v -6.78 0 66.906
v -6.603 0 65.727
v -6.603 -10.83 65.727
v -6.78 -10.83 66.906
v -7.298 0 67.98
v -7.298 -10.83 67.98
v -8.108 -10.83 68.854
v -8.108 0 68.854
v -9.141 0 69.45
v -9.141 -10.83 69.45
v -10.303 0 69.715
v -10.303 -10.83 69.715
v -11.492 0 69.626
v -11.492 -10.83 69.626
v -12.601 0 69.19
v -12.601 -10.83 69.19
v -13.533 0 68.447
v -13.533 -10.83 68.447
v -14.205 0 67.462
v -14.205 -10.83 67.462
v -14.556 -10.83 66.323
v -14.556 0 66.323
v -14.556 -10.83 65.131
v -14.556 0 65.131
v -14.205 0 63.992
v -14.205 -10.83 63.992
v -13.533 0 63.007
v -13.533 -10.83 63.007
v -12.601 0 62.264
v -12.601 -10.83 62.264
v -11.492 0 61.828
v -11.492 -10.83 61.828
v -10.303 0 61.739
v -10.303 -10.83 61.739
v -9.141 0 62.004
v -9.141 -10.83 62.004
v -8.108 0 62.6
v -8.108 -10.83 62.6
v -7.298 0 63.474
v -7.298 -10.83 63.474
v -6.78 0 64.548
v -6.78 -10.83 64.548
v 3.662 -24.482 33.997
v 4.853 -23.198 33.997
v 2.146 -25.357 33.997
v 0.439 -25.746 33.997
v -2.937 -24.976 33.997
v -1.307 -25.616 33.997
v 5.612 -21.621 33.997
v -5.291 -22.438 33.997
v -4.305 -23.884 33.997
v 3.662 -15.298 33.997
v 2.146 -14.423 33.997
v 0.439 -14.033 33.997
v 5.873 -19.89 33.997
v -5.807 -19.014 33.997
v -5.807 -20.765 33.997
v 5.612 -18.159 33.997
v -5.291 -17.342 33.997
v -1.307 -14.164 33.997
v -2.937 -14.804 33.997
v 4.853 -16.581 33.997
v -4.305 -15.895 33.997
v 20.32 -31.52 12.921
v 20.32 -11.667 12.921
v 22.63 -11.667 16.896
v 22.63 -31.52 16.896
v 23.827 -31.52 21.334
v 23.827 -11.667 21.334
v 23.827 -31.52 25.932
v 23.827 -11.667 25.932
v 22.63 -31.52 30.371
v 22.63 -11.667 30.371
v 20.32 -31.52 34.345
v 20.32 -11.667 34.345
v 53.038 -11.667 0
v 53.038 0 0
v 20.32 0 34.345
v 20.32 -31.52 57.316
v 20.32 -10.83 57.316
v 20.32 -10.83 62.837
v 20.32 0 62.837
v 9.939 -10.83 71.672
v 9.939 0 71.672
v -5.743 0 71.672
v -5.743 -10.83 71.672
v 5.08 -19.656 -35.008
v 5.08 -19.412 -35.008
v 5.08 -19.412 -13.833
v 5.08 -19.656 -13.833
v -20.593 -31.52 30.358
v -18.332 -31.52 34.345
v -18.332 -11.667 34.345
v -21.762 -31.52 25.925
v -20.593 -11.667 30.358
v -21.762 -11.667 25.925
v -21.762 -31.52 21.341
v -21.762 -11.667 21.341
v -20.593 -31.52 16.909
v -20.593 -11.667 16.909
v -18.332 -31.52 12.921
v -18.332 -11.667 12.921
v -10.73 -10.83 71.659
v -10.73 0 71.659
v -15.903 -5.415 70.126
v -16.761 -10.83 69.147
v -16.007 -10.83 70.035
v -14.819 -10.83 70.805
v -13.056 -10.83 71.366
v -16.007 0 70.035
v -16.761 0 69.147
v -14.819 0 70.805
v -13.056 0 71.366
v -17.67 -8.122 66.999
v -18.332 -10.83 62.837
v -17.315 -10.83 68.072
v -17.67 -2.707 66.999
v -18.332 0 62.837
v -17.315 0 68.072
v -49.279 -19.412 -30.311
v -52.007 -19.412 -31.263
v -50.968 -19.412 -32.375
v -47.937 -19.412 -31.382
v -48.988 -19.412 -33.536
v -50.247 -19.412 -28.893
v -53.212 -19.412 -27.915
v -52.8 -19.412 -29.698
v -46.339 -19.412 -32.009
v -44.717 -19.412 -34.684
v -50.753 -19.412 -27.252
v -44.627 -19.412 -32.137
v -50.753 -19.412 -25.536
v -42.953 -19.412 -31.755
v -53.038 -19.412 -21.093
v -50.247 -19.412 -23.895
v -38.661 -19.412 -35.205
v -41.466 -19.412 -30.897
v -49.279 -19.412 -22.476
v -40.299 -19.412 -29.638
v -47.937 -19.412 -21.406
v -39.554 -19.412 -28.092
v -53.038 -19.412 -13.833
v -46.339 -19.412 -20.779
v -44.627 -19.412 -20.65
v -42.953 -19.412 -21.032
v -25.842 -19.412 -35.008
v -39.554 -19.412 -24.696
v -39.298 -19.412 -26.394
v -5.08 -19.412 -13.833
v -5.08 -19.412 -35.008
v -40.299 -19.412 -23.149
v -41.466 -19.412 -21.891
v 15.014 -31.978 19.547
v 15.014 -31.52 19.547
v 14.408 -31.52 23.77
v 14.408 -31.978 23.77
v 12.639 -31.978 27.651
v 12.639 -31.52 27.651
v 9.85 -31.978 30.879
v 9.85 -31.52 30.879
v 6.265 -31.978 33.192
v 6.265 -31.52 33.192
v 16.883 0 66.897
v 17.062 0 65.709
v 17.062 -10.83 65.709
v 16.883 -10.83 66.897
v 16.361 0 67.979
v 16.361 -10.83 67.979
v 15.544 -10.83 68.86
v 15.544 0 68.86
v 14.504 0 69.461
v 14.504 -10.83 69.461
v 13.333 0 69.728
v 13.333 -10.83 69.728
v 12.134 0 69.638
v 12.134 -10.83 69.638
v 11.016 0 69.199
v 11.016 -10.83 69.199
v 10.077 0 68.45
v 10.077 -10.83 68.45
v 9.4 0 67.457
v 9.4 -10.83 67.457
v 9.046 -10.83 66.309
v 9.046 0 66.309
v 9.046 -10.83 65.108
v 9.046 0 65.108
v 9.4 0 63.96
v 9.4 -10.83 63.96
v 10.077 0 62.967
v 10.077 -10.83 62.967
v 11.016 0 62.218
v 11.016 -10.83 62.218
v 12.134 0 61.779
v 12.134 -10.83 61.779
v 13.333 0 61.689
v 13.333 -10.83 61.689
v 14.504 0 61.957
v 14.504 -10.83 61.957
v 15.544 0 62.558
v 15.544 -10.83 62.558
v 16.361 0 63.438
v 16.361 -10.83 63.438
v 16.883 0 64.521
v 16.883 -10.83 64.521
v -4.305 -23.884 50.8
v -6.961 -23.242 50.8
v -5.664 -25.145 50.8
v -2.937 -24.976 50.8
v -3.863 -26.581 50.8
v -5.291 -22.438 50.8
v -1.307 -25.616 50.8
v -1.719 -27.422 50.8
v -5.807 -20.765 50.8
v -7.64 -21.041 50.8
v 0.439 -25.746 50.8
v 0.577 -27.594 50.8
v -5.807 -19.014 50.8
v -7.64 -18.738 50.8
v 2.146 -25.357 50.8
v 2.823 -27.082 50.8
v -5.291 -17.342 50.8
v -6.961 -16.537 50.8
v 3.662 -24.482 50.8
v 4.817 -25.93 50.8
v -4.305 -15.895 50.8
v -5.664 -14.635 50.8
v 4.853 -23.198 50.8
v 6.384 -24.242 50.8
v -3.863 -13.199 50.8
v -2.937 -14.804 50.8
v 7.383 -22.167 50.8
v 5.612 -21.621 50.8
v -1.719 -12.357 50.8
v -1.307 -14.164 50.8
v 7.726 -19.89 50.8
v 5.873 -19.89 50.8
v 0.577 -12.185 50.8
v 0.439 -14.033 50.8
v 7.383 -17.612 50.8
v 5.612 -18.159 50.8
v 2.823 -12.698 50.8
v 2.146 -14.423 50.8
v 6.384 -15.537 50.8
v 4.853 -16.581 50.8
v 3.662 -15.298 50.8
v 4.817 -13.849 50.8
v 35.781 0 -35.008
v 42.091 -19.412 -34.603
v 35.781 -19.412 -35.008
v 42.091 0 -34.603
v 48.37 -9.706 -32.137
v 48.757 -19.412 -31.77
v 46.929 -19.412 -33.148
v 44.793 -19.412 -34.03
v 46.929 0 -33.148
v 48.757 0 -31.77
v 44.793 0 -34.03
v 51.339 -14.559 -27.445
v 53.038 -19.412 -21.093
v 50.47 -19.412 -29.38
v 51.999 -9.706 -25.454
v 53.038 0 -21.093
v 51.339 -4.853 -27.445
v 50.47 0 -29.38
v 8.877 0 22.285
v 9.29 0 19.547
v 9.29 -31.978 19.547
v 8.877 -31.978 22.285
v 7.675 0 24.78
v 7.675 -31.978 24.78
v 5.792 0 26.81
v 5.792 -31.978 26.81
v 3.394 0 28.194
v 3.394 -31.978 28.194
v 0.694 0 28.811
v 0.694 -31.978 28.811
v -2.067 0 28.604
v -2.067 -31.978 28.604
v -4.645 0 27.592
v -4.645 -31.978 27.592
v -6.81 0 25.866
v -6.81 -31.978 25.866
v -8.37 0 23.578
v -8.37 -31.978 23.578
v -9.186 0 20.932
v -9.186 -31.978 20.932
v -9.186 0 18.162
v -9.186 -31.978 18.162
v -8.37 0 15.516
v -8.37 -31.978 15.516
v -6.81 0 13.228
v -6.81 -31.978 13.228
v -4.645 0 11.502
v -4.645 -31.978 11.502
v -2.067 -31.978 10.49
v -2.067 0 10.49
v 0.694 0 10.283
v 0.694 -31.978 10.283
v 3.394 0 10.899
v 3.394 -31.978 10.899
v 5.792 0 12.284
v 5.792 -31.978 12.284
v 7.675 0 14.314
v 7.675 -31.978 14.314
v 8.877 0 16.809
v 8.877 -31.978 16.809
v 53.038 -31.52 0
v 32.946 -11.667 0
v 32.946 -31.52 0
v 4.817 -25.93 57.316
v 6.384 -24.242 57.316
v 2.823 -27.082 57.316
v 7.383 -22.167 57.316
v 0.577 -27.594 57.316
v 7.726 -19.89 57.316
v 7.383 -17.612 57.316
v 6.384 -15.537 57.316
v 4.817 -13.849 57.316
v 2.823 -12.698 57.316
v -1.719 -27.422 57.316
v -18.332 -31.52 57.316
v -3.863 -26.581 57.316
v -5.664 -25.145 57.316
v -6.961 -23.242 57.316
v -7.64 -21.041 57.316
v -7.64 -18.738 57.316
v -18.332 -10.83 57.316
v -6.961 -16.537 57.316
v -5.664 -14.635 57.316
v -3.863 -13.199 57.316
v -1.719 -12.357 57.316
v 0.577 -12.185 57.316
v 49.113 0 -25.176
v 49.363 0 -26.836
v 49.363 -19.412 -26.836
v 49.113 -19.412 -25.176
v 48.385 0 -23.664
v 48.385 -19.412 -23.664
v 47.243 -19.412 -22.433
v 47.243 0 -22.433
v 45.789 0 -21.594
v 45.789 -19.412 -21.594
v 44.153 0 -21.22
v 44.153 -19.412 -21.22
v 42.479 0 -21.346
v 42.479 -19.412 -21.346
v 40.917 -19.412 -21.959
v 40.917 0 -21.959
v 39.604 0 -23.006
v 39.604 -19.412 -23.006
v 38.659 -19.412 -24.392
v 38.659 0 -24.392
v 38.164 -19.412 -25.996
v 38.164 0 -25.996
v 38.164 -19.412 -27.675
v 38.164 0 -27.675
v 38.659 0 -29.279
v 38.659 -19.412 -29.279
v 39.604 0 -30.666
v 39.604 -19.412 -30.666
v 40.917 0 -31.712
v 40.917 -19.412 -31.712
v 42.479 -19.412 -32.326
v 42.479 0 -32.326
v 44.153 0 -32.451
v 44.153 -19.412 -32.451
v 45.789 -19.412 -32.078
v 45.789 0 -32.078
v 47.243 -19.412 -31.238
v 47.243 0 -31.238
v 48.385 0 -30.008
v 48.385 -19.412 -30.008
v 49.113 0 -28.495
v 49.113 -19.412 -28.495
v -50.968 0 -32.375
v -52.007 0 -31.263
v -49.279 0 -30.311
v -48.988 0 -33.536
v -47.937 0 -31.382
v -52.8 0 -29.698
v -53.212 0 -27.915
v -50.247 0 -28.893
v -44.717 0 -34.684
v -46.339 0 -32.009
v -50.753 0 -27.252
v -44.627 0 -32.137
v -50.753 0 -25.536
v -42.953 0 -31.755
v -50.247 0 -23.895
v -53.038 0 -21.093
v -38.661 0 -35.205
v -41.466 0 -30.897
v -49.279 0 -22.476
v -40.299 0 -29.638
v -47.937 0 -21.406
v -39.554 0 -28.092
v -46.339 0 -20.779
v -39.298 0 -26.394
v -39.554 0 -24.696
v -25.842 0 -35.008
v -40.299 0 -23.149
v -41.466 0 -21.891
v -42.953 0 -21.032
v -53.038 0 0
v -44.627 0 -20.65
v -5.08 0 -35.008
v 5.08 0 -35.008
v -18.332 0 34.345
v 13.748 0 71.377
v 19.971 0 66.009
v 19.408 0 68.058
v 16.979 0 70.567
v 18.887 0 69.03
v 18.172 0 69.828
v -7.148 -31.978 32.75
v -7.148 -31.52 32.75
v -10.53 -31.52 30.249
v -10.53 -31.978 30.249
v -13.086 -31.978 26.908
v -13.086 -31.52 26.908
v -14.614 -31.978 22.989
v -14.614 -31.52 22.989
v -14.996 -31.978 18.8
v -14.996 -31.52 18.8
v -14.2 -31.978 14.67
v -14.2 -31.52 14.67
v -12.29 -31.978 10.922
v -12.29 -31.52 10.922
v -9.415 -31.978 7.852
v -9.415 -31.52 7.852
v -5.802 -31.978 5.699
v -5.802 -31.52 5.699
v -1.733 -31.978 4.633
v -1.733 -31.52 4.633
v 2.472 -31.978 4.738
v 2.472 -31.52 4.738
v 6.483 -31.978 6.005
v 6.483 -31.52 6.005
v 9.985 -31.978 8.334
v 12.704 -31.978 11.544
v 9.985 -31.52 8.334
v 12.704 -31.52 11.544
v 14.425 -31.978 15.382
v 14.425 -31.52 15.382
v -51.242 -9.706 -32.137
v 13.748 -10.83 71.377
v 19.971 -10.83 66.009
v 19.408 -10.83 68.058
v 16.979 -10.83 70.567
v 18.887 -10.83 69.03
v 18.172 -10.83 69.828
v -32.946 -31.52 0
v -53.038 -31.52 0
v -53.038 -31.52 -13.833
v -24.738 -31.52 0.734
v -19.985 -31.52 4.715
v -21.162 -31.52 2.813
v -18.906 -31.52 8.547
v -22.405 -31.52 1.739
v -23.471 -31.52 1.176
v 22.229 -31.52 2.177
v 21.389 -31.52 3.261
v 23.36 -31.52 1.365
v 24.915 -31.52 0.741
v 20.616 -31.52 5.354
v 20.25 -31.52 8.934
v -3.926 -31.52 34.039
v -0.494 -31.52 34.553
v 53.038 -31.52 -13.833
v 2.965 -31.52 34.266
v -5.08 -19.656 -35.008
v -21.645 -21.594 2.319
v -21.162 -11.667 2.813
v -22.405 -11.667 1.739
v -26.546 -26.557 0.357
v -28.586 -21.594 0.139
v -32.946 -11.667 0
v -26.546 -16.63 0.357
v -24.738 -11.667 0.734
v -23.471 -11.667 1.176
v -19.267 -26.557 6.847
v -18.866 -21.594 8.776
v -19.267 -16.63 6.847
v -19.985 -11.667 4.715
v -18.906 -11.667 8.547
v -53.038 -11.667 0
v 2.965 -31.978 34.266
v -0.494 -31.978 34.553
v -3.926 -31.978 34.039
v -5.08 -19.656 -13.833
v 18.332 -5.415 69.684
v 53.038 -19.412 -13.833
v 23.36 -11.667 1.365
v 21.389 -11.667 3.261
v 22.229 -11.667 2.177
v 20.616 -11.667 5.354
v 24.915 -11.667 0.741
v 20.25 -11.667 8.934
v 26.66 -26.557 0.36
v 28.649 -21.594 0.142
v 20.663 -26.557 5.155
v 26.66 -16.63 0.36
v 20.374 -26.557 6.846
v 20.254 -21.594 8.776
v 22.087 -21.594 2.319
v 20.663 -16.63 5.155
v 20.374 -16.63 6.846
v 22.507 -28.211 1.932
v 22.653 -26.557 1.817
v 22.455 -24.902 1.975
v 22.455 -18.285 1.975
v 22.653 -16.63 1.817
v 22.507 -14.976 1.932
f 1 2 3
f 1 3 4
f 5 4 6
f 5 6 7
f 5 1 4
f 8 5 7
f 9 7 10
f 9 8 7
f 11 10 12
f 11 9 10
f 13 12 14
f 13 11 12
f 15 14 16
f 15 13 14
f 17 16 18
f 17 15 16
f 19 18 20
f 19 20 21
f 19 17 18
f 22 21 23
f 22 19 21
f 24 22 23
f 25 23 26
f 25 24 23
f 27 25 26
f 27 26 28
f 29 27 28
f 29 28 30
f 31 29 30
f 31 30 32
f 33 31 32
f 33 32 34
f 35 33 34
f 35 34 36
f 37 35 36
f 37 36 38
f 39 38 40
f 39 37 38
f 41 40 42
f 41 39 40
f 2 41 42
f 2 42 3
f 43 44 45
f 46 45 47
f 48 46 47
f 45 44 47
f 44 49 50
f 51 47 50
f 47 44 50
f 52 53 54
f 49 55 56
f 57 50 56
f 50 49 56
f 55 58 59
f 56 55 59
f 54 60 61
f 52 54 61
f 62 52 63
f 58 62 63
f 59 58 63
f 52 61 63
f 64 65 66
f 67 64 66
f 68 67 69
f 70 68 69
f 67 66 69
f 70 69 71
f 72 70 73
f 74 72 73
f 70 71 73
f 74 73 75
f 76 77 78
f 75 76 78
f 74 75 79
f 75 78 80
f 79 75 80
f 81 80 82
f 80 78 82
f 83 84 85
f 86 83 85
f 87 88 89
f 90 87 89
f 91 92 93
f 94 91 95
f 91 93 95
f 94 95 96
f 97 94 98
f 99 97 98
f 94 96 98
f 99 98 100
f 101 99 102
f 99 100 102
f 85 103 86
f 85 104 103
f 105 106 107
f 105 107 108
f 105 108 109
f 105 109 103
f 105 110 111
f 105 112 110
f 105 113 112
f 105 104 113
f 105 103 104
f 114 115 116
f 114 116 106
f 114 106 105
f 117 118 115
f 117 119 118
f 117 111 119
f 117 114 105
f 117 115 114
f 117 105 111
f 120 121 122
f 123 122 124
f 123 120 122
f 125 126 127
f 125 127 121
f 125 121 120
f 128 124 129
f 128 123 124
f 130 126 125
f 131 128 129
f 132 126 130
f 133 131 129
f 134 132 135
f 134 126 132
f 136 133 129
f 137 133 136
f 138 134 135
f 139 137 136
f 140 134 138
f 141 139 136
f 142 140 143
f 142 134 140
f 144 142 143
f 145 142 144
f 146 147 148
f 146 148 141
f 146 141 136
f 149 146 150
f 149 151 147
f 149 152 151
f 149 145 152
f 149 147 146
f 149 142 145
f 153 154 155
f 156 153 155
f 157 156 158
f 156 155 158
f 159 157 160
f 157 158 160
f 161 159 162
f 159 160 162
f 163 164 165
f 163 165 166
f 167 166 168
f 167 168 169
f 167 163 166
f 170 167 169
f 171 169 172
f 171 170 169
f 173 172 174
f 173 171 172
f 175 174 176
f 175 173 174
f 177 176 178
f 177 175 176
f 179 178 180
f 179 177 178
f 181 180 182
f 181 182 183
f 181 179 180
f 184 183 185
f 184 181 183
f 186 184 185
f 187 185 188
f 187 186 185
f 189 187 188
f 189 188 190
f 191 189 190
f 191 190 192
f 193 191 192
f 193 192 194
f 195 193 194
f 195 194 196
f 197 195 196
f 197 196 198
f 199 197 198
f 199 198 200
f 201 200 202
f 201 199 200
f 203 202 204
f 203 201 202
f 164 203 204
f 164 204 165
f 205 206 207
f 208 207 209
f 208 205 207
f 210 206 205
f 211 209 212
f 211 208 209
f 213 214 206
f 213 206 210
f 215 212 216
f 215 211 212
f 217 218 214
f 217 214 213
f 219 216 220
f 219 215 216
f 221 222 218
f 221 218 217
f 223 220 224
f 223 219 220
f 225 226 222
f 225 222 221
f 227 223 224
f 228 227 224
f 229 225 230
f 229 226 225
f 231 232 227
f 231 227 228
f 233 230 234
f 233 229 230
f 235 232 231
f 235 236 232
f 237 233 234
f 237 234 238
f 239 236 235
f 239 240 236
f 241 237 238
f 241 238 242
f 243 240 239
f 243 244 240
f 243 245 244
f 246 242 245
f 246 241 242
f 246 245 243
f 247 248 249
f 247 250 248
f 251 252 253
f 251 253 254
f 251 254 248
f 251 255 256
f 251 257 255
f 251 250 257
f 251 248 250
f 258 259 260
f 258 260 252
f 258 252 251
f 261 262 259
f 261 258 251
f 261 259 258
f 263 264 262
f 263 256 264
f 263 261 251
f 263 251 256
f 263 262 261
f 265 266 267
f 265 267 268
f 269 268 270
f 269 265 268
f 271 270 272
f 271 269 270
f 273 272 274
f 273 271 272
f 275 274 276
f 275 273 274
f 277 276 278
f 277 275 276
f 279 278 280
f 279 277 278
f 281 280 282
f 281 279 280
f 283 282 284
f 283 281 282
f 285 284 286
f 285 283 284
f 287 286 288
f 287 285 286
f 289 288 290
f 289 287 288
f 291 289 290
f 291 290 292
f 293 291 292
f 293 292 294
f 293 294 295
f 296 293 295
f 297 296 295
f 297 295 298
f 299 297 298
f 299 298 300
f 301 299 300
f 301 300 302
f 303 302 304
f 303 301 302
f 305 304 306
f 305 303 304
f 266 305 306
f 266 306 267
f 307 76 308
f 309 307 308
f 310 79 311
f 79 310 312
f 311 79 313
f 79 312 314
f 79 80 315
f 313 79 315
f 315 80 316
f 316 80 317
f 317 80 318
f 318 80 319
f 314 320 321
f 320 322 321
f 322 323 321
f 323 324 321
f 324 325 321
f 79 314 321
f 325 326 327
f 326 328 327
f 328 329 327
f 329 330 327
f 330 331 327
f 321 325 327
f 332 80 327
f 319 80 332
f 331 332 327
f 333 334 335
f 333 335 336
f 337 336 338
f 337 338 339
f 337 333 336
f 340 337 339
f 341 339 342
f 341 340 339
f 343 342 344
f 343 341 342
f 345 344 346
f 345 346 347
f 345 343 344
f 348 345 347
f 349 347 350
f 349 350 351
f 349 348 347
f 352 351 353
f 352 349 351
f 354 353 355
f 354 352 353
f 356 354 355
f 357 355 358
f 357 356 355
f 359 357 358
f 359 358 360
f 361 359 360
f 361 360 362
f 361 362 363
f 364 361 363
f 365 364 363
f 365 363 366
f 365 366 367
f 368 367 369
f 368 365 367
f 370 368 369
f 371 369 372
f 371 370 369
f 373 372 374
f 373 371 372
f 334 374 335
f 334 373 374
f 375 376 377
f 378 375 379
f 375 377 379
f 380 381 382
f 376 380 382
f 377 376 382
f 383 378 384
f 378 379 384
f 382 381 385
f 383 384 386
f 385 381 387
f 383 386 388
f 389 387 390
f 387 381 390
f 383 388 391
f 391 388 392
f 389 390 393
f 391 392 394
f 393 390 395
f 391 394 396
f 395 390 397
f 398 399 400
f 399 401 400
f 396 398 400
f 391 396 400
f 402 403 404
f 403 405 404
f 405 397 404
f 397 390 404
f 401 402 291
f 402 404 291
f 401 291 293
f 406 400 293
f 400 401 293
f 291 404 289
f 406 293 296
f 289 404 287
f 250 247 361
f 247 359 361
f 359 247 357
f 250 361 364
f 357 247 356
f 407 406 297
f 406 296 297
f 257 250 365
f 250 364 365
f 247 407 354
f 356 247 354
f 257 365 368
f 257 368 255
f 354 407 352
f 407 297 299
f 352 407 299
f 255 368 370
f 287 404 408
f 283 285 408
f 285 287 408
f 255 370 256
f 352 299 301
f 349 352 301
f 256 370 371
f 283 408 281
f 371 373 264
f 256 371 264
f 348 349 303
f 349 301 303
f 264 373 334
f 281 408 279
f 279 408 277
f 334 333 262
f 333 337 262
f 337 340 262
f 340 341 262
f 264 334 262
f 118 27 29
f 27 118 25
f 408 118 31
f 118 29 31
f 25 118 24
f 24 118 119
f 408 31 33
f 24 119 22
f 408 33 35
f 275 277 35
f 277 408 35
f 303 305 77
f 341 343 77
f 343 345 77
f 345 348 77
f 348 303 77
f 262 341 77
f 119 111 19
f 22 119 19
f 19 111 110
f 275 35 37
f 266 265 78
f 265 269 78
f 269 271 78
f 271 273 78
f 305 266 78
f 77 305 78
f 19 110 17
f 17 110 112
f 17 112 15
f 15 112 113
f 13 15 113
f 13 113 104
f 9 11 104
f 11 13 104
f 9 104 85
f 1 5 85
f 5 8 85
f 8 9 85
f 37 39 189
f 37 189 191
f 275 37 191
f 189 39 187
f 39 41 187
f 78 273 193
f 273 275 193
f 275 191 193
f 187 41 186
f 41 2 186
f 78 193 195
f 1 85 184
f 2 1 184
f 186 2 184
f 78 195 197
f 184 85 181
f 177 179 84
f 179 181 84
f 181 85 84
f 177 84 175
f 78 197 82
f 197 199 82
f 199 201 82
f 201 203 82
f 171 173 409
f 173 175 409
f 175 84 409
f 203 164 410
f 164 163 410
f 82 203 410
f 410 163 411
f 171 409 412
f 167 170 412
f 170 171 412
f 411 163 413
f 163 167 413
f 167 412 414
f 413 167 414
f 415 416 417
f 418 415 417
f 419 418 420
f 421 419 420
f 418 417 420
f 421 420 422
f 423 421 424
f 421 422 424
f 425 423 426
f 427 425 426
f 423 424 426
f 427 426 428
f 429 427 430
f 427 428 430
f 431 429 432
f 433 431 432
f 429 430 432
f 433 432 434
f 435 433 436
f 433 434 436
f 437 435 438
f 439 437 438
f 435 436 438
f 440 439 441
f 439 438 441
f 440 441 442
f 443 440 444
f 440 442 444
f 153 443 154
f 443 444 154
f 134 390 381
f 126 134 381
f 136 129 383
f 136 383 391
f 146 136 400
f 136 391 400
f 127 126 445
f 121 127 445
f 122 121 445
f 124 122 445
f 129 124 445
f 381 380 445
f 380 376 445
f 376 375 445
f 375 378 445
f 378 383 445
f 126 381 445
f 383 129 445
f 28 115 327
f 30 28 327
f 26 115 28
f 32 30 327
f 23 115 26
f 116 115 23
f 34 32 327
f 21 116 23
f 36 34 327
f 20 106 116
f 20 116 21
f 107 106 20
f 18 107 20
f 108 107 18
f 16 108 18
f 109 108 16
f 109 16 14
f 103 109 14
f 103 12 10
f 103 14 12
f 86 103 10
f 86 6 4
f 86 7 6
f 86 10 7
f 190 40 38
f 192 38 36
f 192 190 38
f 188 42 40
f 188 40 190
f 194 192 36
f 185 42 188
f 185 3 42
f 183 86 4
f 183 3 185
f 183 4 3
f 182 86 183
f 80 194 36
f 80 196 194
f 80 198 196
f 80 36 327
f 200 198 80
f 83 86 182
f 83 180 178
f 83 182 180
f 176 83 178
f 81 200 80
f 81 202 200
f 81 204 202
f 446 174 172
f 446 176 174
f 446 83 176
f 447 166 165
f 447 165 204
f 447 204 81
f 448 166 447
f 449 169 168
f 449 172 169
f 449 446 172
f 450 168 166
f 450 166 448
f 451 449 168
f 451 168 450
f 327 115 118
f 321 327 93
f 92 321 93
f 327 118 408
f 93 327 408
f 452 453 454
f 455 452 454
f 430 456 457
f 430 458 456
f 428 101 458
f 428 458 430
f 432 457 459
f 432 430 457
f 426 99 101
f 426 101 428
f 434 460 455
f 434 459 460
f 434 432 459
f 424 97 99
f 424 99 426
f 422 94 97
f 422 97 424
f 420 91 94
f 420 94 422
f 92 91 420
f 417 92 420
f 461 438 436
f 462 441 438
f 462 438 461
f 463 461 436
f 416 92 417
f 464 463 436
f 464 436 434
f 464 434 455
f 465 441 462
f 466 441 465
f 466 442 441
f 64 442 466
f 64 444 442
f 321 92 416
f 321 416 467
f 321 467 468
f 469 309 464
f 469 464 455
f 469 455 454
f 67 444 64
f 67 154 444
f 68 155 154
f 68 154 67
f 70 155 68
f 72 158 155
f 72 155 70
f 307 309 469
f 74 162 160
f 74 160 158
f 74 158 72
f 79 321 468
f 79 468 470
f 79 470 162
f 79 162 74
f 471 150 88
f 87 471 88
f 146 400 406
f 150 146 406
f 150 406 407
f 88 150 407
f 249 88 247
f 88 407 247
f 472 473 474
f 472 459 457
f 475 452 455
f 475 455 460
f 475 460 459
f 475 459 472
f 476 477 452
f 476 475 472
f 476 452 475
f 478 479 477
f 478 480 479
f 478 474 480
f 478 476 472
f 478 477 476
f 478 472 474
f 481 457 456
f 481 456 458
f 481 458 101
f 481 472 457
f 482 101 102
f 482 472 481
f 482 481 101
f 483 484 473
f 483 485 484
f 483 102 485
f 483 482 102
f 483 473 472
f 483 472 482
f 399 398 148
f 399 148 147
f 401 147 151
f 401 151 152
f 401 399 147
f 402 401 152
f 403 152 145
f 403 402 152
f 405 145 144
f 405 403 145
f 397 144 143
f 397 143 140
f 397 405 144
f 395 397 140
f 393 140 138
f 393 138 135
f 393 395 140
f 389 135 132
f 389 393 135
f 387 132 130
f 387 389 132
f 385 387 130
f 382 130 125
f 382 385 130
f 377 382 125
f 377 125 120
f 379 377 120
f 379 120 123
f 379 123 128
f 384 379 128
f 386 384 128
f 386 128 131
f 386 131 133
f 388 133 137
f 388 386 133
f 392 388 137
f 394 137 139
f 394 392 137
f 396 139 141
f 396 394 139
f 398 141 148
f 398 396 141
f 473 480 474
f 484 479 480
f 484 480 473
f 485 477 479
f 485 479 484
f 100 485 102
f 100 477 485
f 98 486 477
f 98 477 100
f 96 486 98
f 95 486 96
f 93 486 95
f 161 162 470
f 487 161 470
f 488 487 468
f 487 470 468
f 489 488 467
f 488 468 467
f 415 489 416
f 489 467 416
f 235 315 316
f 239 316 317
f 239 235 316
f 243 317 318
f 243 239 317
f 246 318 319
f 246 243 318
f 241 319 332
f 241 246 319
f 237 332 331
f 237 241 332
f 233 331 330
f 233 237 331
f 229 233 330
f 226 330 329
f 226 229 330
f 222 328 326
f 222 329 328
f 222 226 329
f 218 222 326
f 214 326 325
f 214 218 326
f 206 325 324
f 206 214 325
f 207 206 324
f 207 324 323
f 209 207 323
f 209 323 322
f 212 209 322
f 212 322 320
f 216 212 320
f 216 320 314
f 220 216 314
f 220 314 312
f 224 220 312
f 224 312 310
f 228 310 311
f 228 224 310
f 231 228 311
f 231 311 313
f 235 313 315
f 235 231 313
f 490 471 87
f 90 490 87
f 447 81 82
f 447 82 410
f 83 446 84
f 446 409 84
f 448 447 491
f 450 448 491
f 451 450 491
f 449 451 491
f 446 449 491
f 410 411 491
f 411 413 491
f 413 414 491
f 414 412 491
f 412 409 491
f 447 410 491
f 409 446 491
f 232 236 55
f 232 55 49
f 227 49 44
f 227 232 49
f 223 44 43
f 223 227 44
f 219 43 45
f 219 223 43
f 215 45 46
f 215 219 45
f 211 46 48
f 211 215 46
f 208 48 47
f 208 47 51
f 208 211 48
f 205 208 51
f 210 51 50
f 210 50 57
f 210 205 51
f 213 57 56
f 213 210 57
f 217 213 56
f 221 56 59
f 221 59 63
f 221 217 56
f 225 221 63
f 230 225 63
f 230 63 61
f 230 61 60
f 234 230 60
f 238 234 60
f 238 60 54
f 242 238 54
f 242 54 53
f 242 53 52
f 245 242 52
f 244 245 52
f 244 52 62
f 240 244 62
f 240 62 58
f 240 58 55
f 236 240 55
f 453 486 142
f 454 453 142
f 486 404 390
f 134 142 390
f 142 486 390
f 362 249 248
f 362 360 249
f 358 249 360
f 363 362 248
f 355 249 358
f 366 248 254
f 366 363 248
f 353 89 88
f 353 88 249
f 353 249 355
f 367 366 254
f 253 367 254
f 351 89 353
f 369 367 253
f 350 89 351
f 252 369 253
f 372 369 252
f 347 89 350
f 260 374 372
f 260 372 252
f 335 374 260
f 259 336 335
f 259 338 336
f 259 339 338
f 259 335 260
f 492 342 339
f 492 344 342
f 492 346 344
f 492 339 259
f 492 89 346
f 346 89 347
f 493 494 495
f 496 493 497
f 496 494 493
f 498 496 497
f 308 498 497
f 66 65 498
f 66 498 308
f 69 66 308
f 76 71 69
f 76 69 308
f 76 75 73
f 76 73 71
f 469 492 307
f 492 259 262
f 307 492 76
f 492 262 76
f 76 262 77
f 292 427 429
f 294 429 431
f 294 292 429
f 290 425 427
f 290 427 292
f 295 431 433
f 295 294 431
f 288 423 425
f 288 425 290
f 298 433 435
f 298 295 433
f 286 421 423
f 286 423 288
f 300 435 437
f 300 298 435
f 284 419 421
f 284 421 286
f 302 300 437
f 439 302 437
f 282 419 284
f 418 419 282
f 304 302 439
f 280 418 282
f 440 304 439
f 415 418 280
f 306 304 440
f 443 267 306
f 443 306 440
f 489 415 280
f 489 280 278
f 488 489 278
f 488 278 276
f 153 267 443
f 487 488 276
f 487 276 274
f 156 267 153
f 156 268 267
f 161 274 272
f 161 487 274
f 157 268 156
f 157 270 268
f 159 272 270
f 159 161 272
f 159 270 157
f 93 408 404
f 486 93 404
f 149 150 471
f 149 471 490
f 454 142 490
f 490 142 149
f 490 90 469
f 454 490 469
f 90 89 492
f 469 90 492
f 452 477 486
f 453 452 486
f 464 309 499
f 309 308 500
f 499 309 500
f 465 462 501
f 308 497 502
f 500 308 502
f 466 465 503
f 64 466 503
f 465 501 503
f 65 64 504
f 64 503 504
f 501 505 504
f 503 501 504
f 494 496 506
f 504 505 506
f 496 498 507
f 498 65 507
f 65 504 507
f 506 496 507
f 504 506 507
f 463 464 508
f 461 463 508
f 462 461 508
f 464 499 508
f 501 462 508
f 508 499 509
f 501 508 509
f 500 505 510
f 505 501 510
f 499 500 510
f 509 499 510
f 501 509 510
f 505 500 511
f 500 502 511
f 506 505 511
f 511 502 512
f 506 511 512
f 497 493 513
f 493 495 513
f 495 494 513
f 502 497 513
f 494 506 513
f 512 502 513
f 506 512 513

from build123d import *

# Parameters (mm, degrees)
F1_DEPTH  = 31.52012
F0_R      = 3.9989944529
F0_R_2    = 4.0304935081
F2_DEPTH  = 10.8295
F3_DEPTH  = 11.66704
F0_R_3    = 9.2896599899
F4_DEPTH  = 31.97776
F6_R      = 7.7262681343
F6_R_2    = 5.87306791
F7_DEPTH  = 7.37838
F9_DEPTH  = 23.31858
F0_R_4    = 5.7595758306
F0_R_5    = 5.6310949549
F10_DEPTH = 19.41152
F0_W      = 10.16
F0_H      = 21.1746012493
F11_DEPTH = 19.65592


# Not quite as in the source:
# - a feature names something its author has since deleted; it is built from what else it names
# - the program builds the solid bodies; features that only make, move or delete a surface that nothing else refers to are left out


with BuildPart() as f1:
    # F0 (on Front) → F1 (new body)
    with BuildSketch(Plane.XZ):
        with BuildLine():
            Line((-32.945703147, 0), (-53.0377118984, 0))
            Line((-53.0377118984, 0), (-53.0377118984, -13.8332377828))
            Line((-53.0377118984, -13.8332377828), (-5.08, -13.8332377828))
            Line((-5.08, -13.8332377828), (5.08, -13.8332377828))
            Line((5.08, -13.8332377828), (53.0377118984, -13.8332377828))
            Line((53.0377118984, -13.8332377828), (53.0377118984, 0))
            Line((53.0377118984, 0), (32.945703147, 0))
            add(Edge.make_bspline(
                [(32.945703147, 0), (28.5647447129, 0.0625927983), (19.8735598839, 0.1867678132), (20.1720018391, 8.6992646442), (20.3200084018, 12.9208741543)],
                knots=[0, 0, 0, 0, 0.5040691828, 1, 1, 1, 1], degree=3))
            ThreePointArc((20.3200084018, 12.9208741543), (23.9781287511, 23.6330514006), (20.3200084018, 34.345228647))
            Line((20.3200084018, 34.345228647), (20.3200084018, 57.3156722881))
            Line((20.3200084018, 57.3156722881), (-18.3321793468, 57.3156722881))
            Line((-18.3321793468, 57.3156722881), (-18.3321793468, 34.345228647))
            ThreePointArc((-18.3321793468, 34.345228647), (-21.9102829622, 23.6330514006), (-18.3321793468, 12.9208741543))
            add(Edge.make_bspline(
                [(-32.945703147, 0), (-28.5122837396, 0.0592468916), (-19.728591274, 0.176629532), (-18.7947032642, 8.6996856696), (-18.3321793468, 12.9208741543)],
                knots=[0, 0, 0, 0, 0.5047329952, 1, 1, 1, 1], degree=3))
        make_face()
        with BuildLine():
            ThreePointArc((6.2648822412, 33.191720318), (12.6390408842, 27.6514544893), (15.0142637131, 19.5469643528))
            ThreePointArc((15.0142637131, 19.5469643528), (-7.6843579979, 6.6481753784), (-7.1484956716, 32.75026411))
            ThreePointArc((-7.1484956716, 32.75026411), (-0.4938765731, 34.5531031225), (6.2648822412, 33.191720318))
        make_face(mode=Mode.SUBTRACT)
    extrude(amount=F1_DEPTH)

    # F0 (on Front) → F2 (join)
    with BuildSketch(Plane.XZ):
        with BuildLine():
            Line((-18.3321793468, 62.8374100943), (-18.3321793468, 57.3156722881))
            Line((-18.3321793468, 57.3156722881), (20.3200084018, 57.3156722881))
            Line((20.3200084018, 57.3156722881), (20.3200084018, 62.8374100943))
            add(Edge.make_bspline(
                [(20.3200084018, 62.8374100943), (20.1052749574, 65.5197235908), (19.6543576651, 71.15229537), (13.2786405866, 71.4934853371), (9.9391337225, 71.6721956254)],
                knots=[0, 0, 0, 0, 0.4762147029, 1, 1, 1, 1], degree=3))
            Line((9.9391337225, 71.6721956254), (-5.7426103852, 71.6721956254))
            add(Edge.make_bspline(
                [(-18.3321793468, 62.8374100943), (-18.0134703448, 65.7269619482), (-17.326155356, 71.9584530192), (-9.7862501304, 71.772123737), (-5.7426103852, 71.6721956254)],
                knots=[0, 0, 0, 0, 0.4637015156, 1, 1, 1, 1], degree=3))
        make_face()
        with Locations((-10.6017430574, 65.7269619482)):
            Circle(F0_R, mode=Mode.SUBTRACT)
        with Locations((13.0313078181, 65.7087189627)):
            Circle(F0_R_2, mode=Mode.SUBTRACT)
    extrude(amount=F2_DEPTH)

    # F0 (on Front) → F3 (join)
    with BuildSketch(Plane.XZ):
        with BuildLine():
            Line((-18.3321793468, 34.345228647), (-53.0377118984, 0))
            Line((-53.0377118984, 0), (-32.945703147, 0))
            add(Edge.make_bspline(
                [(-32.945703147, 0), (-28.5122837396, 0.0592468916), (-19.728591274, 0.176629532), (-18.7947032642, 8.6996856696), (-18.3321793468, 12.9208741543)],
                knots=[0, 0, 0, 0, 0.5047329952, 1, 1, 1, 1], degree=3))
            ThreePointArc((-18.3321793468, 12.9208741543), (-21.9102829622, 23.6330514006), (-18.3321793468, 34.345228647))
        make_face()
        with BuildLine():
            Line((53.0377118984, 0), (20.3200084018, 34.345228647))
            ThreePointArc((20.3200084018, 34.345228647), (23.9781287511, 23.6330514006), (20.3200084018, 12.9208741543))
            add(Edge.make_bspline(
                [(32.945703147, 0), (28.5647447129, 0.0625927983), (19.8735598839, 0.1867678132), (20.1720018391, 8.6992646442), (20.3200084018, 12.9208741543)],
                knots=[0, 0, 0, 0, 0.5040691828, 1, 1, 1, 1], degree=3))
            Line((32.945703147, 0), (53.0377118984, 0))
        make_face()
    extrude(amount=F3_DEPTH)

    # F0 (on Front) → F4 (join)
    with BuildSketch(Plane.XZ):
        with BuildLine():
            ThreePointArc((-7.1484956716, 32.75026411), (-7.6843579979, 6.6481753784), (15.0142637131, 19.5469643528))
            ThreePointArc((15.0142637131, 19.5469643528), (12.6390408842, 27.6514544893), (6.2648822412, 33.191720318))
            ThreePointArc((6.2648822412, 33.191720318), (-0.4938765731, 34.5531031225), (-7.1484956716, 32.75026411))
        make_face()
        with Locations((0, 19.5469643528)):
            Circle(F0_R_3, mode=Mode.SUBTRACT)
    extrude(amount=F4_DEPTH)

    # F6 (on offset) → F7 (cut)
    with BuildSketch(Plane.XY.offset(50.8)):
        with Locations((0, -19.8897793889)):
            Circle(F6_R)
        with Locations((0, -19.8897793889)):
            Circle(F6_R_2, mode=Mode.SUBTRACT)
    extrude(amount=F7_DEPTH, mode=Mode.SUBTRACT)

    # F9 (cut): a face of the model
    f9_faces = [f1.faces().sort_by_distance(p)[0] for p in [
        (0, -19.8897793889, 57.3156722881),
    ]]
    extrude(f9_faces, amount=-F9_DEPTH, mode=Mode.SUBTRACT)

    # F0 (on Front) → F10 (join)
    with BuildSketch(Plane.XZ):
        with BuildLine():
            Line((-5.08, -13.8332377828), (-53.0377118984, -13.8332377828))
            Line((-53.0377118984, -13.8332377828), (-53.0377118984, -21.0930503504))
            add(Edge.make_bspline(
                [(-53.0377118984, -21.0930503504), (-53.4005944702, -25.2780429079), (-54.7251608325, -36.2581171884), (-35.7792689312, -35.346119388), (-25.8417483085, -35.0078390322)],
                knots=[0, 0, 0, 0, 0.3981682681, 1, 1, 1, 1], degree=3))
            Line((-25.8417483085, -35.0078390322), (-5.08, -35.0078390322))
            Line((-5.08, -35.0078390322), (-5.08, -13.8332377828))
        make_face()
        with Locations((-45.0574053683, -26.3939229293)):
            Circle(F0_R_4, mode=Mode.SUBTRACT)
        with BuildLine():
            Line((53.0377118984, -13.8332377828), (5.08, -13.8332377828))
            Line((5.08, -13.8332377828), (5.08, -35.0078390322))
            Line((5.08, -35.0078390322), (35.7808830812, -35.0078390322))
            add(Edge.make_bspline(
                [(53.0377118984, -21.0930503504), (52.1158724207, -25.6188280404), (49.8115979989, -34.1905224475), (41.3452471932, -34.893061815), (35.7808830812, -35.0078390322)],
                knots=[0, 0, 0, 0, 0.4907243677, 1, 1, 1, 1], degree=3))
            Line((53.0377118984, -21.0930503504), (53.0377118984, -13.8332377828))
        make_face()
        with Locations((43.7321887989, -26.8356617858)):
            Circle(F0_R_5, mode=Mode.SUBTRACT)
    extrude(amount=F10_DEPTH)

    # F0 (on Front) → F11 (join)
    with BuildSketch(Plane.XZ):
        with Locations((0, -24.4205384075)):
            Rectangle(F0_W, F0_H)
    extrude(amount=F11_DEPTH)


solid = f1.part
